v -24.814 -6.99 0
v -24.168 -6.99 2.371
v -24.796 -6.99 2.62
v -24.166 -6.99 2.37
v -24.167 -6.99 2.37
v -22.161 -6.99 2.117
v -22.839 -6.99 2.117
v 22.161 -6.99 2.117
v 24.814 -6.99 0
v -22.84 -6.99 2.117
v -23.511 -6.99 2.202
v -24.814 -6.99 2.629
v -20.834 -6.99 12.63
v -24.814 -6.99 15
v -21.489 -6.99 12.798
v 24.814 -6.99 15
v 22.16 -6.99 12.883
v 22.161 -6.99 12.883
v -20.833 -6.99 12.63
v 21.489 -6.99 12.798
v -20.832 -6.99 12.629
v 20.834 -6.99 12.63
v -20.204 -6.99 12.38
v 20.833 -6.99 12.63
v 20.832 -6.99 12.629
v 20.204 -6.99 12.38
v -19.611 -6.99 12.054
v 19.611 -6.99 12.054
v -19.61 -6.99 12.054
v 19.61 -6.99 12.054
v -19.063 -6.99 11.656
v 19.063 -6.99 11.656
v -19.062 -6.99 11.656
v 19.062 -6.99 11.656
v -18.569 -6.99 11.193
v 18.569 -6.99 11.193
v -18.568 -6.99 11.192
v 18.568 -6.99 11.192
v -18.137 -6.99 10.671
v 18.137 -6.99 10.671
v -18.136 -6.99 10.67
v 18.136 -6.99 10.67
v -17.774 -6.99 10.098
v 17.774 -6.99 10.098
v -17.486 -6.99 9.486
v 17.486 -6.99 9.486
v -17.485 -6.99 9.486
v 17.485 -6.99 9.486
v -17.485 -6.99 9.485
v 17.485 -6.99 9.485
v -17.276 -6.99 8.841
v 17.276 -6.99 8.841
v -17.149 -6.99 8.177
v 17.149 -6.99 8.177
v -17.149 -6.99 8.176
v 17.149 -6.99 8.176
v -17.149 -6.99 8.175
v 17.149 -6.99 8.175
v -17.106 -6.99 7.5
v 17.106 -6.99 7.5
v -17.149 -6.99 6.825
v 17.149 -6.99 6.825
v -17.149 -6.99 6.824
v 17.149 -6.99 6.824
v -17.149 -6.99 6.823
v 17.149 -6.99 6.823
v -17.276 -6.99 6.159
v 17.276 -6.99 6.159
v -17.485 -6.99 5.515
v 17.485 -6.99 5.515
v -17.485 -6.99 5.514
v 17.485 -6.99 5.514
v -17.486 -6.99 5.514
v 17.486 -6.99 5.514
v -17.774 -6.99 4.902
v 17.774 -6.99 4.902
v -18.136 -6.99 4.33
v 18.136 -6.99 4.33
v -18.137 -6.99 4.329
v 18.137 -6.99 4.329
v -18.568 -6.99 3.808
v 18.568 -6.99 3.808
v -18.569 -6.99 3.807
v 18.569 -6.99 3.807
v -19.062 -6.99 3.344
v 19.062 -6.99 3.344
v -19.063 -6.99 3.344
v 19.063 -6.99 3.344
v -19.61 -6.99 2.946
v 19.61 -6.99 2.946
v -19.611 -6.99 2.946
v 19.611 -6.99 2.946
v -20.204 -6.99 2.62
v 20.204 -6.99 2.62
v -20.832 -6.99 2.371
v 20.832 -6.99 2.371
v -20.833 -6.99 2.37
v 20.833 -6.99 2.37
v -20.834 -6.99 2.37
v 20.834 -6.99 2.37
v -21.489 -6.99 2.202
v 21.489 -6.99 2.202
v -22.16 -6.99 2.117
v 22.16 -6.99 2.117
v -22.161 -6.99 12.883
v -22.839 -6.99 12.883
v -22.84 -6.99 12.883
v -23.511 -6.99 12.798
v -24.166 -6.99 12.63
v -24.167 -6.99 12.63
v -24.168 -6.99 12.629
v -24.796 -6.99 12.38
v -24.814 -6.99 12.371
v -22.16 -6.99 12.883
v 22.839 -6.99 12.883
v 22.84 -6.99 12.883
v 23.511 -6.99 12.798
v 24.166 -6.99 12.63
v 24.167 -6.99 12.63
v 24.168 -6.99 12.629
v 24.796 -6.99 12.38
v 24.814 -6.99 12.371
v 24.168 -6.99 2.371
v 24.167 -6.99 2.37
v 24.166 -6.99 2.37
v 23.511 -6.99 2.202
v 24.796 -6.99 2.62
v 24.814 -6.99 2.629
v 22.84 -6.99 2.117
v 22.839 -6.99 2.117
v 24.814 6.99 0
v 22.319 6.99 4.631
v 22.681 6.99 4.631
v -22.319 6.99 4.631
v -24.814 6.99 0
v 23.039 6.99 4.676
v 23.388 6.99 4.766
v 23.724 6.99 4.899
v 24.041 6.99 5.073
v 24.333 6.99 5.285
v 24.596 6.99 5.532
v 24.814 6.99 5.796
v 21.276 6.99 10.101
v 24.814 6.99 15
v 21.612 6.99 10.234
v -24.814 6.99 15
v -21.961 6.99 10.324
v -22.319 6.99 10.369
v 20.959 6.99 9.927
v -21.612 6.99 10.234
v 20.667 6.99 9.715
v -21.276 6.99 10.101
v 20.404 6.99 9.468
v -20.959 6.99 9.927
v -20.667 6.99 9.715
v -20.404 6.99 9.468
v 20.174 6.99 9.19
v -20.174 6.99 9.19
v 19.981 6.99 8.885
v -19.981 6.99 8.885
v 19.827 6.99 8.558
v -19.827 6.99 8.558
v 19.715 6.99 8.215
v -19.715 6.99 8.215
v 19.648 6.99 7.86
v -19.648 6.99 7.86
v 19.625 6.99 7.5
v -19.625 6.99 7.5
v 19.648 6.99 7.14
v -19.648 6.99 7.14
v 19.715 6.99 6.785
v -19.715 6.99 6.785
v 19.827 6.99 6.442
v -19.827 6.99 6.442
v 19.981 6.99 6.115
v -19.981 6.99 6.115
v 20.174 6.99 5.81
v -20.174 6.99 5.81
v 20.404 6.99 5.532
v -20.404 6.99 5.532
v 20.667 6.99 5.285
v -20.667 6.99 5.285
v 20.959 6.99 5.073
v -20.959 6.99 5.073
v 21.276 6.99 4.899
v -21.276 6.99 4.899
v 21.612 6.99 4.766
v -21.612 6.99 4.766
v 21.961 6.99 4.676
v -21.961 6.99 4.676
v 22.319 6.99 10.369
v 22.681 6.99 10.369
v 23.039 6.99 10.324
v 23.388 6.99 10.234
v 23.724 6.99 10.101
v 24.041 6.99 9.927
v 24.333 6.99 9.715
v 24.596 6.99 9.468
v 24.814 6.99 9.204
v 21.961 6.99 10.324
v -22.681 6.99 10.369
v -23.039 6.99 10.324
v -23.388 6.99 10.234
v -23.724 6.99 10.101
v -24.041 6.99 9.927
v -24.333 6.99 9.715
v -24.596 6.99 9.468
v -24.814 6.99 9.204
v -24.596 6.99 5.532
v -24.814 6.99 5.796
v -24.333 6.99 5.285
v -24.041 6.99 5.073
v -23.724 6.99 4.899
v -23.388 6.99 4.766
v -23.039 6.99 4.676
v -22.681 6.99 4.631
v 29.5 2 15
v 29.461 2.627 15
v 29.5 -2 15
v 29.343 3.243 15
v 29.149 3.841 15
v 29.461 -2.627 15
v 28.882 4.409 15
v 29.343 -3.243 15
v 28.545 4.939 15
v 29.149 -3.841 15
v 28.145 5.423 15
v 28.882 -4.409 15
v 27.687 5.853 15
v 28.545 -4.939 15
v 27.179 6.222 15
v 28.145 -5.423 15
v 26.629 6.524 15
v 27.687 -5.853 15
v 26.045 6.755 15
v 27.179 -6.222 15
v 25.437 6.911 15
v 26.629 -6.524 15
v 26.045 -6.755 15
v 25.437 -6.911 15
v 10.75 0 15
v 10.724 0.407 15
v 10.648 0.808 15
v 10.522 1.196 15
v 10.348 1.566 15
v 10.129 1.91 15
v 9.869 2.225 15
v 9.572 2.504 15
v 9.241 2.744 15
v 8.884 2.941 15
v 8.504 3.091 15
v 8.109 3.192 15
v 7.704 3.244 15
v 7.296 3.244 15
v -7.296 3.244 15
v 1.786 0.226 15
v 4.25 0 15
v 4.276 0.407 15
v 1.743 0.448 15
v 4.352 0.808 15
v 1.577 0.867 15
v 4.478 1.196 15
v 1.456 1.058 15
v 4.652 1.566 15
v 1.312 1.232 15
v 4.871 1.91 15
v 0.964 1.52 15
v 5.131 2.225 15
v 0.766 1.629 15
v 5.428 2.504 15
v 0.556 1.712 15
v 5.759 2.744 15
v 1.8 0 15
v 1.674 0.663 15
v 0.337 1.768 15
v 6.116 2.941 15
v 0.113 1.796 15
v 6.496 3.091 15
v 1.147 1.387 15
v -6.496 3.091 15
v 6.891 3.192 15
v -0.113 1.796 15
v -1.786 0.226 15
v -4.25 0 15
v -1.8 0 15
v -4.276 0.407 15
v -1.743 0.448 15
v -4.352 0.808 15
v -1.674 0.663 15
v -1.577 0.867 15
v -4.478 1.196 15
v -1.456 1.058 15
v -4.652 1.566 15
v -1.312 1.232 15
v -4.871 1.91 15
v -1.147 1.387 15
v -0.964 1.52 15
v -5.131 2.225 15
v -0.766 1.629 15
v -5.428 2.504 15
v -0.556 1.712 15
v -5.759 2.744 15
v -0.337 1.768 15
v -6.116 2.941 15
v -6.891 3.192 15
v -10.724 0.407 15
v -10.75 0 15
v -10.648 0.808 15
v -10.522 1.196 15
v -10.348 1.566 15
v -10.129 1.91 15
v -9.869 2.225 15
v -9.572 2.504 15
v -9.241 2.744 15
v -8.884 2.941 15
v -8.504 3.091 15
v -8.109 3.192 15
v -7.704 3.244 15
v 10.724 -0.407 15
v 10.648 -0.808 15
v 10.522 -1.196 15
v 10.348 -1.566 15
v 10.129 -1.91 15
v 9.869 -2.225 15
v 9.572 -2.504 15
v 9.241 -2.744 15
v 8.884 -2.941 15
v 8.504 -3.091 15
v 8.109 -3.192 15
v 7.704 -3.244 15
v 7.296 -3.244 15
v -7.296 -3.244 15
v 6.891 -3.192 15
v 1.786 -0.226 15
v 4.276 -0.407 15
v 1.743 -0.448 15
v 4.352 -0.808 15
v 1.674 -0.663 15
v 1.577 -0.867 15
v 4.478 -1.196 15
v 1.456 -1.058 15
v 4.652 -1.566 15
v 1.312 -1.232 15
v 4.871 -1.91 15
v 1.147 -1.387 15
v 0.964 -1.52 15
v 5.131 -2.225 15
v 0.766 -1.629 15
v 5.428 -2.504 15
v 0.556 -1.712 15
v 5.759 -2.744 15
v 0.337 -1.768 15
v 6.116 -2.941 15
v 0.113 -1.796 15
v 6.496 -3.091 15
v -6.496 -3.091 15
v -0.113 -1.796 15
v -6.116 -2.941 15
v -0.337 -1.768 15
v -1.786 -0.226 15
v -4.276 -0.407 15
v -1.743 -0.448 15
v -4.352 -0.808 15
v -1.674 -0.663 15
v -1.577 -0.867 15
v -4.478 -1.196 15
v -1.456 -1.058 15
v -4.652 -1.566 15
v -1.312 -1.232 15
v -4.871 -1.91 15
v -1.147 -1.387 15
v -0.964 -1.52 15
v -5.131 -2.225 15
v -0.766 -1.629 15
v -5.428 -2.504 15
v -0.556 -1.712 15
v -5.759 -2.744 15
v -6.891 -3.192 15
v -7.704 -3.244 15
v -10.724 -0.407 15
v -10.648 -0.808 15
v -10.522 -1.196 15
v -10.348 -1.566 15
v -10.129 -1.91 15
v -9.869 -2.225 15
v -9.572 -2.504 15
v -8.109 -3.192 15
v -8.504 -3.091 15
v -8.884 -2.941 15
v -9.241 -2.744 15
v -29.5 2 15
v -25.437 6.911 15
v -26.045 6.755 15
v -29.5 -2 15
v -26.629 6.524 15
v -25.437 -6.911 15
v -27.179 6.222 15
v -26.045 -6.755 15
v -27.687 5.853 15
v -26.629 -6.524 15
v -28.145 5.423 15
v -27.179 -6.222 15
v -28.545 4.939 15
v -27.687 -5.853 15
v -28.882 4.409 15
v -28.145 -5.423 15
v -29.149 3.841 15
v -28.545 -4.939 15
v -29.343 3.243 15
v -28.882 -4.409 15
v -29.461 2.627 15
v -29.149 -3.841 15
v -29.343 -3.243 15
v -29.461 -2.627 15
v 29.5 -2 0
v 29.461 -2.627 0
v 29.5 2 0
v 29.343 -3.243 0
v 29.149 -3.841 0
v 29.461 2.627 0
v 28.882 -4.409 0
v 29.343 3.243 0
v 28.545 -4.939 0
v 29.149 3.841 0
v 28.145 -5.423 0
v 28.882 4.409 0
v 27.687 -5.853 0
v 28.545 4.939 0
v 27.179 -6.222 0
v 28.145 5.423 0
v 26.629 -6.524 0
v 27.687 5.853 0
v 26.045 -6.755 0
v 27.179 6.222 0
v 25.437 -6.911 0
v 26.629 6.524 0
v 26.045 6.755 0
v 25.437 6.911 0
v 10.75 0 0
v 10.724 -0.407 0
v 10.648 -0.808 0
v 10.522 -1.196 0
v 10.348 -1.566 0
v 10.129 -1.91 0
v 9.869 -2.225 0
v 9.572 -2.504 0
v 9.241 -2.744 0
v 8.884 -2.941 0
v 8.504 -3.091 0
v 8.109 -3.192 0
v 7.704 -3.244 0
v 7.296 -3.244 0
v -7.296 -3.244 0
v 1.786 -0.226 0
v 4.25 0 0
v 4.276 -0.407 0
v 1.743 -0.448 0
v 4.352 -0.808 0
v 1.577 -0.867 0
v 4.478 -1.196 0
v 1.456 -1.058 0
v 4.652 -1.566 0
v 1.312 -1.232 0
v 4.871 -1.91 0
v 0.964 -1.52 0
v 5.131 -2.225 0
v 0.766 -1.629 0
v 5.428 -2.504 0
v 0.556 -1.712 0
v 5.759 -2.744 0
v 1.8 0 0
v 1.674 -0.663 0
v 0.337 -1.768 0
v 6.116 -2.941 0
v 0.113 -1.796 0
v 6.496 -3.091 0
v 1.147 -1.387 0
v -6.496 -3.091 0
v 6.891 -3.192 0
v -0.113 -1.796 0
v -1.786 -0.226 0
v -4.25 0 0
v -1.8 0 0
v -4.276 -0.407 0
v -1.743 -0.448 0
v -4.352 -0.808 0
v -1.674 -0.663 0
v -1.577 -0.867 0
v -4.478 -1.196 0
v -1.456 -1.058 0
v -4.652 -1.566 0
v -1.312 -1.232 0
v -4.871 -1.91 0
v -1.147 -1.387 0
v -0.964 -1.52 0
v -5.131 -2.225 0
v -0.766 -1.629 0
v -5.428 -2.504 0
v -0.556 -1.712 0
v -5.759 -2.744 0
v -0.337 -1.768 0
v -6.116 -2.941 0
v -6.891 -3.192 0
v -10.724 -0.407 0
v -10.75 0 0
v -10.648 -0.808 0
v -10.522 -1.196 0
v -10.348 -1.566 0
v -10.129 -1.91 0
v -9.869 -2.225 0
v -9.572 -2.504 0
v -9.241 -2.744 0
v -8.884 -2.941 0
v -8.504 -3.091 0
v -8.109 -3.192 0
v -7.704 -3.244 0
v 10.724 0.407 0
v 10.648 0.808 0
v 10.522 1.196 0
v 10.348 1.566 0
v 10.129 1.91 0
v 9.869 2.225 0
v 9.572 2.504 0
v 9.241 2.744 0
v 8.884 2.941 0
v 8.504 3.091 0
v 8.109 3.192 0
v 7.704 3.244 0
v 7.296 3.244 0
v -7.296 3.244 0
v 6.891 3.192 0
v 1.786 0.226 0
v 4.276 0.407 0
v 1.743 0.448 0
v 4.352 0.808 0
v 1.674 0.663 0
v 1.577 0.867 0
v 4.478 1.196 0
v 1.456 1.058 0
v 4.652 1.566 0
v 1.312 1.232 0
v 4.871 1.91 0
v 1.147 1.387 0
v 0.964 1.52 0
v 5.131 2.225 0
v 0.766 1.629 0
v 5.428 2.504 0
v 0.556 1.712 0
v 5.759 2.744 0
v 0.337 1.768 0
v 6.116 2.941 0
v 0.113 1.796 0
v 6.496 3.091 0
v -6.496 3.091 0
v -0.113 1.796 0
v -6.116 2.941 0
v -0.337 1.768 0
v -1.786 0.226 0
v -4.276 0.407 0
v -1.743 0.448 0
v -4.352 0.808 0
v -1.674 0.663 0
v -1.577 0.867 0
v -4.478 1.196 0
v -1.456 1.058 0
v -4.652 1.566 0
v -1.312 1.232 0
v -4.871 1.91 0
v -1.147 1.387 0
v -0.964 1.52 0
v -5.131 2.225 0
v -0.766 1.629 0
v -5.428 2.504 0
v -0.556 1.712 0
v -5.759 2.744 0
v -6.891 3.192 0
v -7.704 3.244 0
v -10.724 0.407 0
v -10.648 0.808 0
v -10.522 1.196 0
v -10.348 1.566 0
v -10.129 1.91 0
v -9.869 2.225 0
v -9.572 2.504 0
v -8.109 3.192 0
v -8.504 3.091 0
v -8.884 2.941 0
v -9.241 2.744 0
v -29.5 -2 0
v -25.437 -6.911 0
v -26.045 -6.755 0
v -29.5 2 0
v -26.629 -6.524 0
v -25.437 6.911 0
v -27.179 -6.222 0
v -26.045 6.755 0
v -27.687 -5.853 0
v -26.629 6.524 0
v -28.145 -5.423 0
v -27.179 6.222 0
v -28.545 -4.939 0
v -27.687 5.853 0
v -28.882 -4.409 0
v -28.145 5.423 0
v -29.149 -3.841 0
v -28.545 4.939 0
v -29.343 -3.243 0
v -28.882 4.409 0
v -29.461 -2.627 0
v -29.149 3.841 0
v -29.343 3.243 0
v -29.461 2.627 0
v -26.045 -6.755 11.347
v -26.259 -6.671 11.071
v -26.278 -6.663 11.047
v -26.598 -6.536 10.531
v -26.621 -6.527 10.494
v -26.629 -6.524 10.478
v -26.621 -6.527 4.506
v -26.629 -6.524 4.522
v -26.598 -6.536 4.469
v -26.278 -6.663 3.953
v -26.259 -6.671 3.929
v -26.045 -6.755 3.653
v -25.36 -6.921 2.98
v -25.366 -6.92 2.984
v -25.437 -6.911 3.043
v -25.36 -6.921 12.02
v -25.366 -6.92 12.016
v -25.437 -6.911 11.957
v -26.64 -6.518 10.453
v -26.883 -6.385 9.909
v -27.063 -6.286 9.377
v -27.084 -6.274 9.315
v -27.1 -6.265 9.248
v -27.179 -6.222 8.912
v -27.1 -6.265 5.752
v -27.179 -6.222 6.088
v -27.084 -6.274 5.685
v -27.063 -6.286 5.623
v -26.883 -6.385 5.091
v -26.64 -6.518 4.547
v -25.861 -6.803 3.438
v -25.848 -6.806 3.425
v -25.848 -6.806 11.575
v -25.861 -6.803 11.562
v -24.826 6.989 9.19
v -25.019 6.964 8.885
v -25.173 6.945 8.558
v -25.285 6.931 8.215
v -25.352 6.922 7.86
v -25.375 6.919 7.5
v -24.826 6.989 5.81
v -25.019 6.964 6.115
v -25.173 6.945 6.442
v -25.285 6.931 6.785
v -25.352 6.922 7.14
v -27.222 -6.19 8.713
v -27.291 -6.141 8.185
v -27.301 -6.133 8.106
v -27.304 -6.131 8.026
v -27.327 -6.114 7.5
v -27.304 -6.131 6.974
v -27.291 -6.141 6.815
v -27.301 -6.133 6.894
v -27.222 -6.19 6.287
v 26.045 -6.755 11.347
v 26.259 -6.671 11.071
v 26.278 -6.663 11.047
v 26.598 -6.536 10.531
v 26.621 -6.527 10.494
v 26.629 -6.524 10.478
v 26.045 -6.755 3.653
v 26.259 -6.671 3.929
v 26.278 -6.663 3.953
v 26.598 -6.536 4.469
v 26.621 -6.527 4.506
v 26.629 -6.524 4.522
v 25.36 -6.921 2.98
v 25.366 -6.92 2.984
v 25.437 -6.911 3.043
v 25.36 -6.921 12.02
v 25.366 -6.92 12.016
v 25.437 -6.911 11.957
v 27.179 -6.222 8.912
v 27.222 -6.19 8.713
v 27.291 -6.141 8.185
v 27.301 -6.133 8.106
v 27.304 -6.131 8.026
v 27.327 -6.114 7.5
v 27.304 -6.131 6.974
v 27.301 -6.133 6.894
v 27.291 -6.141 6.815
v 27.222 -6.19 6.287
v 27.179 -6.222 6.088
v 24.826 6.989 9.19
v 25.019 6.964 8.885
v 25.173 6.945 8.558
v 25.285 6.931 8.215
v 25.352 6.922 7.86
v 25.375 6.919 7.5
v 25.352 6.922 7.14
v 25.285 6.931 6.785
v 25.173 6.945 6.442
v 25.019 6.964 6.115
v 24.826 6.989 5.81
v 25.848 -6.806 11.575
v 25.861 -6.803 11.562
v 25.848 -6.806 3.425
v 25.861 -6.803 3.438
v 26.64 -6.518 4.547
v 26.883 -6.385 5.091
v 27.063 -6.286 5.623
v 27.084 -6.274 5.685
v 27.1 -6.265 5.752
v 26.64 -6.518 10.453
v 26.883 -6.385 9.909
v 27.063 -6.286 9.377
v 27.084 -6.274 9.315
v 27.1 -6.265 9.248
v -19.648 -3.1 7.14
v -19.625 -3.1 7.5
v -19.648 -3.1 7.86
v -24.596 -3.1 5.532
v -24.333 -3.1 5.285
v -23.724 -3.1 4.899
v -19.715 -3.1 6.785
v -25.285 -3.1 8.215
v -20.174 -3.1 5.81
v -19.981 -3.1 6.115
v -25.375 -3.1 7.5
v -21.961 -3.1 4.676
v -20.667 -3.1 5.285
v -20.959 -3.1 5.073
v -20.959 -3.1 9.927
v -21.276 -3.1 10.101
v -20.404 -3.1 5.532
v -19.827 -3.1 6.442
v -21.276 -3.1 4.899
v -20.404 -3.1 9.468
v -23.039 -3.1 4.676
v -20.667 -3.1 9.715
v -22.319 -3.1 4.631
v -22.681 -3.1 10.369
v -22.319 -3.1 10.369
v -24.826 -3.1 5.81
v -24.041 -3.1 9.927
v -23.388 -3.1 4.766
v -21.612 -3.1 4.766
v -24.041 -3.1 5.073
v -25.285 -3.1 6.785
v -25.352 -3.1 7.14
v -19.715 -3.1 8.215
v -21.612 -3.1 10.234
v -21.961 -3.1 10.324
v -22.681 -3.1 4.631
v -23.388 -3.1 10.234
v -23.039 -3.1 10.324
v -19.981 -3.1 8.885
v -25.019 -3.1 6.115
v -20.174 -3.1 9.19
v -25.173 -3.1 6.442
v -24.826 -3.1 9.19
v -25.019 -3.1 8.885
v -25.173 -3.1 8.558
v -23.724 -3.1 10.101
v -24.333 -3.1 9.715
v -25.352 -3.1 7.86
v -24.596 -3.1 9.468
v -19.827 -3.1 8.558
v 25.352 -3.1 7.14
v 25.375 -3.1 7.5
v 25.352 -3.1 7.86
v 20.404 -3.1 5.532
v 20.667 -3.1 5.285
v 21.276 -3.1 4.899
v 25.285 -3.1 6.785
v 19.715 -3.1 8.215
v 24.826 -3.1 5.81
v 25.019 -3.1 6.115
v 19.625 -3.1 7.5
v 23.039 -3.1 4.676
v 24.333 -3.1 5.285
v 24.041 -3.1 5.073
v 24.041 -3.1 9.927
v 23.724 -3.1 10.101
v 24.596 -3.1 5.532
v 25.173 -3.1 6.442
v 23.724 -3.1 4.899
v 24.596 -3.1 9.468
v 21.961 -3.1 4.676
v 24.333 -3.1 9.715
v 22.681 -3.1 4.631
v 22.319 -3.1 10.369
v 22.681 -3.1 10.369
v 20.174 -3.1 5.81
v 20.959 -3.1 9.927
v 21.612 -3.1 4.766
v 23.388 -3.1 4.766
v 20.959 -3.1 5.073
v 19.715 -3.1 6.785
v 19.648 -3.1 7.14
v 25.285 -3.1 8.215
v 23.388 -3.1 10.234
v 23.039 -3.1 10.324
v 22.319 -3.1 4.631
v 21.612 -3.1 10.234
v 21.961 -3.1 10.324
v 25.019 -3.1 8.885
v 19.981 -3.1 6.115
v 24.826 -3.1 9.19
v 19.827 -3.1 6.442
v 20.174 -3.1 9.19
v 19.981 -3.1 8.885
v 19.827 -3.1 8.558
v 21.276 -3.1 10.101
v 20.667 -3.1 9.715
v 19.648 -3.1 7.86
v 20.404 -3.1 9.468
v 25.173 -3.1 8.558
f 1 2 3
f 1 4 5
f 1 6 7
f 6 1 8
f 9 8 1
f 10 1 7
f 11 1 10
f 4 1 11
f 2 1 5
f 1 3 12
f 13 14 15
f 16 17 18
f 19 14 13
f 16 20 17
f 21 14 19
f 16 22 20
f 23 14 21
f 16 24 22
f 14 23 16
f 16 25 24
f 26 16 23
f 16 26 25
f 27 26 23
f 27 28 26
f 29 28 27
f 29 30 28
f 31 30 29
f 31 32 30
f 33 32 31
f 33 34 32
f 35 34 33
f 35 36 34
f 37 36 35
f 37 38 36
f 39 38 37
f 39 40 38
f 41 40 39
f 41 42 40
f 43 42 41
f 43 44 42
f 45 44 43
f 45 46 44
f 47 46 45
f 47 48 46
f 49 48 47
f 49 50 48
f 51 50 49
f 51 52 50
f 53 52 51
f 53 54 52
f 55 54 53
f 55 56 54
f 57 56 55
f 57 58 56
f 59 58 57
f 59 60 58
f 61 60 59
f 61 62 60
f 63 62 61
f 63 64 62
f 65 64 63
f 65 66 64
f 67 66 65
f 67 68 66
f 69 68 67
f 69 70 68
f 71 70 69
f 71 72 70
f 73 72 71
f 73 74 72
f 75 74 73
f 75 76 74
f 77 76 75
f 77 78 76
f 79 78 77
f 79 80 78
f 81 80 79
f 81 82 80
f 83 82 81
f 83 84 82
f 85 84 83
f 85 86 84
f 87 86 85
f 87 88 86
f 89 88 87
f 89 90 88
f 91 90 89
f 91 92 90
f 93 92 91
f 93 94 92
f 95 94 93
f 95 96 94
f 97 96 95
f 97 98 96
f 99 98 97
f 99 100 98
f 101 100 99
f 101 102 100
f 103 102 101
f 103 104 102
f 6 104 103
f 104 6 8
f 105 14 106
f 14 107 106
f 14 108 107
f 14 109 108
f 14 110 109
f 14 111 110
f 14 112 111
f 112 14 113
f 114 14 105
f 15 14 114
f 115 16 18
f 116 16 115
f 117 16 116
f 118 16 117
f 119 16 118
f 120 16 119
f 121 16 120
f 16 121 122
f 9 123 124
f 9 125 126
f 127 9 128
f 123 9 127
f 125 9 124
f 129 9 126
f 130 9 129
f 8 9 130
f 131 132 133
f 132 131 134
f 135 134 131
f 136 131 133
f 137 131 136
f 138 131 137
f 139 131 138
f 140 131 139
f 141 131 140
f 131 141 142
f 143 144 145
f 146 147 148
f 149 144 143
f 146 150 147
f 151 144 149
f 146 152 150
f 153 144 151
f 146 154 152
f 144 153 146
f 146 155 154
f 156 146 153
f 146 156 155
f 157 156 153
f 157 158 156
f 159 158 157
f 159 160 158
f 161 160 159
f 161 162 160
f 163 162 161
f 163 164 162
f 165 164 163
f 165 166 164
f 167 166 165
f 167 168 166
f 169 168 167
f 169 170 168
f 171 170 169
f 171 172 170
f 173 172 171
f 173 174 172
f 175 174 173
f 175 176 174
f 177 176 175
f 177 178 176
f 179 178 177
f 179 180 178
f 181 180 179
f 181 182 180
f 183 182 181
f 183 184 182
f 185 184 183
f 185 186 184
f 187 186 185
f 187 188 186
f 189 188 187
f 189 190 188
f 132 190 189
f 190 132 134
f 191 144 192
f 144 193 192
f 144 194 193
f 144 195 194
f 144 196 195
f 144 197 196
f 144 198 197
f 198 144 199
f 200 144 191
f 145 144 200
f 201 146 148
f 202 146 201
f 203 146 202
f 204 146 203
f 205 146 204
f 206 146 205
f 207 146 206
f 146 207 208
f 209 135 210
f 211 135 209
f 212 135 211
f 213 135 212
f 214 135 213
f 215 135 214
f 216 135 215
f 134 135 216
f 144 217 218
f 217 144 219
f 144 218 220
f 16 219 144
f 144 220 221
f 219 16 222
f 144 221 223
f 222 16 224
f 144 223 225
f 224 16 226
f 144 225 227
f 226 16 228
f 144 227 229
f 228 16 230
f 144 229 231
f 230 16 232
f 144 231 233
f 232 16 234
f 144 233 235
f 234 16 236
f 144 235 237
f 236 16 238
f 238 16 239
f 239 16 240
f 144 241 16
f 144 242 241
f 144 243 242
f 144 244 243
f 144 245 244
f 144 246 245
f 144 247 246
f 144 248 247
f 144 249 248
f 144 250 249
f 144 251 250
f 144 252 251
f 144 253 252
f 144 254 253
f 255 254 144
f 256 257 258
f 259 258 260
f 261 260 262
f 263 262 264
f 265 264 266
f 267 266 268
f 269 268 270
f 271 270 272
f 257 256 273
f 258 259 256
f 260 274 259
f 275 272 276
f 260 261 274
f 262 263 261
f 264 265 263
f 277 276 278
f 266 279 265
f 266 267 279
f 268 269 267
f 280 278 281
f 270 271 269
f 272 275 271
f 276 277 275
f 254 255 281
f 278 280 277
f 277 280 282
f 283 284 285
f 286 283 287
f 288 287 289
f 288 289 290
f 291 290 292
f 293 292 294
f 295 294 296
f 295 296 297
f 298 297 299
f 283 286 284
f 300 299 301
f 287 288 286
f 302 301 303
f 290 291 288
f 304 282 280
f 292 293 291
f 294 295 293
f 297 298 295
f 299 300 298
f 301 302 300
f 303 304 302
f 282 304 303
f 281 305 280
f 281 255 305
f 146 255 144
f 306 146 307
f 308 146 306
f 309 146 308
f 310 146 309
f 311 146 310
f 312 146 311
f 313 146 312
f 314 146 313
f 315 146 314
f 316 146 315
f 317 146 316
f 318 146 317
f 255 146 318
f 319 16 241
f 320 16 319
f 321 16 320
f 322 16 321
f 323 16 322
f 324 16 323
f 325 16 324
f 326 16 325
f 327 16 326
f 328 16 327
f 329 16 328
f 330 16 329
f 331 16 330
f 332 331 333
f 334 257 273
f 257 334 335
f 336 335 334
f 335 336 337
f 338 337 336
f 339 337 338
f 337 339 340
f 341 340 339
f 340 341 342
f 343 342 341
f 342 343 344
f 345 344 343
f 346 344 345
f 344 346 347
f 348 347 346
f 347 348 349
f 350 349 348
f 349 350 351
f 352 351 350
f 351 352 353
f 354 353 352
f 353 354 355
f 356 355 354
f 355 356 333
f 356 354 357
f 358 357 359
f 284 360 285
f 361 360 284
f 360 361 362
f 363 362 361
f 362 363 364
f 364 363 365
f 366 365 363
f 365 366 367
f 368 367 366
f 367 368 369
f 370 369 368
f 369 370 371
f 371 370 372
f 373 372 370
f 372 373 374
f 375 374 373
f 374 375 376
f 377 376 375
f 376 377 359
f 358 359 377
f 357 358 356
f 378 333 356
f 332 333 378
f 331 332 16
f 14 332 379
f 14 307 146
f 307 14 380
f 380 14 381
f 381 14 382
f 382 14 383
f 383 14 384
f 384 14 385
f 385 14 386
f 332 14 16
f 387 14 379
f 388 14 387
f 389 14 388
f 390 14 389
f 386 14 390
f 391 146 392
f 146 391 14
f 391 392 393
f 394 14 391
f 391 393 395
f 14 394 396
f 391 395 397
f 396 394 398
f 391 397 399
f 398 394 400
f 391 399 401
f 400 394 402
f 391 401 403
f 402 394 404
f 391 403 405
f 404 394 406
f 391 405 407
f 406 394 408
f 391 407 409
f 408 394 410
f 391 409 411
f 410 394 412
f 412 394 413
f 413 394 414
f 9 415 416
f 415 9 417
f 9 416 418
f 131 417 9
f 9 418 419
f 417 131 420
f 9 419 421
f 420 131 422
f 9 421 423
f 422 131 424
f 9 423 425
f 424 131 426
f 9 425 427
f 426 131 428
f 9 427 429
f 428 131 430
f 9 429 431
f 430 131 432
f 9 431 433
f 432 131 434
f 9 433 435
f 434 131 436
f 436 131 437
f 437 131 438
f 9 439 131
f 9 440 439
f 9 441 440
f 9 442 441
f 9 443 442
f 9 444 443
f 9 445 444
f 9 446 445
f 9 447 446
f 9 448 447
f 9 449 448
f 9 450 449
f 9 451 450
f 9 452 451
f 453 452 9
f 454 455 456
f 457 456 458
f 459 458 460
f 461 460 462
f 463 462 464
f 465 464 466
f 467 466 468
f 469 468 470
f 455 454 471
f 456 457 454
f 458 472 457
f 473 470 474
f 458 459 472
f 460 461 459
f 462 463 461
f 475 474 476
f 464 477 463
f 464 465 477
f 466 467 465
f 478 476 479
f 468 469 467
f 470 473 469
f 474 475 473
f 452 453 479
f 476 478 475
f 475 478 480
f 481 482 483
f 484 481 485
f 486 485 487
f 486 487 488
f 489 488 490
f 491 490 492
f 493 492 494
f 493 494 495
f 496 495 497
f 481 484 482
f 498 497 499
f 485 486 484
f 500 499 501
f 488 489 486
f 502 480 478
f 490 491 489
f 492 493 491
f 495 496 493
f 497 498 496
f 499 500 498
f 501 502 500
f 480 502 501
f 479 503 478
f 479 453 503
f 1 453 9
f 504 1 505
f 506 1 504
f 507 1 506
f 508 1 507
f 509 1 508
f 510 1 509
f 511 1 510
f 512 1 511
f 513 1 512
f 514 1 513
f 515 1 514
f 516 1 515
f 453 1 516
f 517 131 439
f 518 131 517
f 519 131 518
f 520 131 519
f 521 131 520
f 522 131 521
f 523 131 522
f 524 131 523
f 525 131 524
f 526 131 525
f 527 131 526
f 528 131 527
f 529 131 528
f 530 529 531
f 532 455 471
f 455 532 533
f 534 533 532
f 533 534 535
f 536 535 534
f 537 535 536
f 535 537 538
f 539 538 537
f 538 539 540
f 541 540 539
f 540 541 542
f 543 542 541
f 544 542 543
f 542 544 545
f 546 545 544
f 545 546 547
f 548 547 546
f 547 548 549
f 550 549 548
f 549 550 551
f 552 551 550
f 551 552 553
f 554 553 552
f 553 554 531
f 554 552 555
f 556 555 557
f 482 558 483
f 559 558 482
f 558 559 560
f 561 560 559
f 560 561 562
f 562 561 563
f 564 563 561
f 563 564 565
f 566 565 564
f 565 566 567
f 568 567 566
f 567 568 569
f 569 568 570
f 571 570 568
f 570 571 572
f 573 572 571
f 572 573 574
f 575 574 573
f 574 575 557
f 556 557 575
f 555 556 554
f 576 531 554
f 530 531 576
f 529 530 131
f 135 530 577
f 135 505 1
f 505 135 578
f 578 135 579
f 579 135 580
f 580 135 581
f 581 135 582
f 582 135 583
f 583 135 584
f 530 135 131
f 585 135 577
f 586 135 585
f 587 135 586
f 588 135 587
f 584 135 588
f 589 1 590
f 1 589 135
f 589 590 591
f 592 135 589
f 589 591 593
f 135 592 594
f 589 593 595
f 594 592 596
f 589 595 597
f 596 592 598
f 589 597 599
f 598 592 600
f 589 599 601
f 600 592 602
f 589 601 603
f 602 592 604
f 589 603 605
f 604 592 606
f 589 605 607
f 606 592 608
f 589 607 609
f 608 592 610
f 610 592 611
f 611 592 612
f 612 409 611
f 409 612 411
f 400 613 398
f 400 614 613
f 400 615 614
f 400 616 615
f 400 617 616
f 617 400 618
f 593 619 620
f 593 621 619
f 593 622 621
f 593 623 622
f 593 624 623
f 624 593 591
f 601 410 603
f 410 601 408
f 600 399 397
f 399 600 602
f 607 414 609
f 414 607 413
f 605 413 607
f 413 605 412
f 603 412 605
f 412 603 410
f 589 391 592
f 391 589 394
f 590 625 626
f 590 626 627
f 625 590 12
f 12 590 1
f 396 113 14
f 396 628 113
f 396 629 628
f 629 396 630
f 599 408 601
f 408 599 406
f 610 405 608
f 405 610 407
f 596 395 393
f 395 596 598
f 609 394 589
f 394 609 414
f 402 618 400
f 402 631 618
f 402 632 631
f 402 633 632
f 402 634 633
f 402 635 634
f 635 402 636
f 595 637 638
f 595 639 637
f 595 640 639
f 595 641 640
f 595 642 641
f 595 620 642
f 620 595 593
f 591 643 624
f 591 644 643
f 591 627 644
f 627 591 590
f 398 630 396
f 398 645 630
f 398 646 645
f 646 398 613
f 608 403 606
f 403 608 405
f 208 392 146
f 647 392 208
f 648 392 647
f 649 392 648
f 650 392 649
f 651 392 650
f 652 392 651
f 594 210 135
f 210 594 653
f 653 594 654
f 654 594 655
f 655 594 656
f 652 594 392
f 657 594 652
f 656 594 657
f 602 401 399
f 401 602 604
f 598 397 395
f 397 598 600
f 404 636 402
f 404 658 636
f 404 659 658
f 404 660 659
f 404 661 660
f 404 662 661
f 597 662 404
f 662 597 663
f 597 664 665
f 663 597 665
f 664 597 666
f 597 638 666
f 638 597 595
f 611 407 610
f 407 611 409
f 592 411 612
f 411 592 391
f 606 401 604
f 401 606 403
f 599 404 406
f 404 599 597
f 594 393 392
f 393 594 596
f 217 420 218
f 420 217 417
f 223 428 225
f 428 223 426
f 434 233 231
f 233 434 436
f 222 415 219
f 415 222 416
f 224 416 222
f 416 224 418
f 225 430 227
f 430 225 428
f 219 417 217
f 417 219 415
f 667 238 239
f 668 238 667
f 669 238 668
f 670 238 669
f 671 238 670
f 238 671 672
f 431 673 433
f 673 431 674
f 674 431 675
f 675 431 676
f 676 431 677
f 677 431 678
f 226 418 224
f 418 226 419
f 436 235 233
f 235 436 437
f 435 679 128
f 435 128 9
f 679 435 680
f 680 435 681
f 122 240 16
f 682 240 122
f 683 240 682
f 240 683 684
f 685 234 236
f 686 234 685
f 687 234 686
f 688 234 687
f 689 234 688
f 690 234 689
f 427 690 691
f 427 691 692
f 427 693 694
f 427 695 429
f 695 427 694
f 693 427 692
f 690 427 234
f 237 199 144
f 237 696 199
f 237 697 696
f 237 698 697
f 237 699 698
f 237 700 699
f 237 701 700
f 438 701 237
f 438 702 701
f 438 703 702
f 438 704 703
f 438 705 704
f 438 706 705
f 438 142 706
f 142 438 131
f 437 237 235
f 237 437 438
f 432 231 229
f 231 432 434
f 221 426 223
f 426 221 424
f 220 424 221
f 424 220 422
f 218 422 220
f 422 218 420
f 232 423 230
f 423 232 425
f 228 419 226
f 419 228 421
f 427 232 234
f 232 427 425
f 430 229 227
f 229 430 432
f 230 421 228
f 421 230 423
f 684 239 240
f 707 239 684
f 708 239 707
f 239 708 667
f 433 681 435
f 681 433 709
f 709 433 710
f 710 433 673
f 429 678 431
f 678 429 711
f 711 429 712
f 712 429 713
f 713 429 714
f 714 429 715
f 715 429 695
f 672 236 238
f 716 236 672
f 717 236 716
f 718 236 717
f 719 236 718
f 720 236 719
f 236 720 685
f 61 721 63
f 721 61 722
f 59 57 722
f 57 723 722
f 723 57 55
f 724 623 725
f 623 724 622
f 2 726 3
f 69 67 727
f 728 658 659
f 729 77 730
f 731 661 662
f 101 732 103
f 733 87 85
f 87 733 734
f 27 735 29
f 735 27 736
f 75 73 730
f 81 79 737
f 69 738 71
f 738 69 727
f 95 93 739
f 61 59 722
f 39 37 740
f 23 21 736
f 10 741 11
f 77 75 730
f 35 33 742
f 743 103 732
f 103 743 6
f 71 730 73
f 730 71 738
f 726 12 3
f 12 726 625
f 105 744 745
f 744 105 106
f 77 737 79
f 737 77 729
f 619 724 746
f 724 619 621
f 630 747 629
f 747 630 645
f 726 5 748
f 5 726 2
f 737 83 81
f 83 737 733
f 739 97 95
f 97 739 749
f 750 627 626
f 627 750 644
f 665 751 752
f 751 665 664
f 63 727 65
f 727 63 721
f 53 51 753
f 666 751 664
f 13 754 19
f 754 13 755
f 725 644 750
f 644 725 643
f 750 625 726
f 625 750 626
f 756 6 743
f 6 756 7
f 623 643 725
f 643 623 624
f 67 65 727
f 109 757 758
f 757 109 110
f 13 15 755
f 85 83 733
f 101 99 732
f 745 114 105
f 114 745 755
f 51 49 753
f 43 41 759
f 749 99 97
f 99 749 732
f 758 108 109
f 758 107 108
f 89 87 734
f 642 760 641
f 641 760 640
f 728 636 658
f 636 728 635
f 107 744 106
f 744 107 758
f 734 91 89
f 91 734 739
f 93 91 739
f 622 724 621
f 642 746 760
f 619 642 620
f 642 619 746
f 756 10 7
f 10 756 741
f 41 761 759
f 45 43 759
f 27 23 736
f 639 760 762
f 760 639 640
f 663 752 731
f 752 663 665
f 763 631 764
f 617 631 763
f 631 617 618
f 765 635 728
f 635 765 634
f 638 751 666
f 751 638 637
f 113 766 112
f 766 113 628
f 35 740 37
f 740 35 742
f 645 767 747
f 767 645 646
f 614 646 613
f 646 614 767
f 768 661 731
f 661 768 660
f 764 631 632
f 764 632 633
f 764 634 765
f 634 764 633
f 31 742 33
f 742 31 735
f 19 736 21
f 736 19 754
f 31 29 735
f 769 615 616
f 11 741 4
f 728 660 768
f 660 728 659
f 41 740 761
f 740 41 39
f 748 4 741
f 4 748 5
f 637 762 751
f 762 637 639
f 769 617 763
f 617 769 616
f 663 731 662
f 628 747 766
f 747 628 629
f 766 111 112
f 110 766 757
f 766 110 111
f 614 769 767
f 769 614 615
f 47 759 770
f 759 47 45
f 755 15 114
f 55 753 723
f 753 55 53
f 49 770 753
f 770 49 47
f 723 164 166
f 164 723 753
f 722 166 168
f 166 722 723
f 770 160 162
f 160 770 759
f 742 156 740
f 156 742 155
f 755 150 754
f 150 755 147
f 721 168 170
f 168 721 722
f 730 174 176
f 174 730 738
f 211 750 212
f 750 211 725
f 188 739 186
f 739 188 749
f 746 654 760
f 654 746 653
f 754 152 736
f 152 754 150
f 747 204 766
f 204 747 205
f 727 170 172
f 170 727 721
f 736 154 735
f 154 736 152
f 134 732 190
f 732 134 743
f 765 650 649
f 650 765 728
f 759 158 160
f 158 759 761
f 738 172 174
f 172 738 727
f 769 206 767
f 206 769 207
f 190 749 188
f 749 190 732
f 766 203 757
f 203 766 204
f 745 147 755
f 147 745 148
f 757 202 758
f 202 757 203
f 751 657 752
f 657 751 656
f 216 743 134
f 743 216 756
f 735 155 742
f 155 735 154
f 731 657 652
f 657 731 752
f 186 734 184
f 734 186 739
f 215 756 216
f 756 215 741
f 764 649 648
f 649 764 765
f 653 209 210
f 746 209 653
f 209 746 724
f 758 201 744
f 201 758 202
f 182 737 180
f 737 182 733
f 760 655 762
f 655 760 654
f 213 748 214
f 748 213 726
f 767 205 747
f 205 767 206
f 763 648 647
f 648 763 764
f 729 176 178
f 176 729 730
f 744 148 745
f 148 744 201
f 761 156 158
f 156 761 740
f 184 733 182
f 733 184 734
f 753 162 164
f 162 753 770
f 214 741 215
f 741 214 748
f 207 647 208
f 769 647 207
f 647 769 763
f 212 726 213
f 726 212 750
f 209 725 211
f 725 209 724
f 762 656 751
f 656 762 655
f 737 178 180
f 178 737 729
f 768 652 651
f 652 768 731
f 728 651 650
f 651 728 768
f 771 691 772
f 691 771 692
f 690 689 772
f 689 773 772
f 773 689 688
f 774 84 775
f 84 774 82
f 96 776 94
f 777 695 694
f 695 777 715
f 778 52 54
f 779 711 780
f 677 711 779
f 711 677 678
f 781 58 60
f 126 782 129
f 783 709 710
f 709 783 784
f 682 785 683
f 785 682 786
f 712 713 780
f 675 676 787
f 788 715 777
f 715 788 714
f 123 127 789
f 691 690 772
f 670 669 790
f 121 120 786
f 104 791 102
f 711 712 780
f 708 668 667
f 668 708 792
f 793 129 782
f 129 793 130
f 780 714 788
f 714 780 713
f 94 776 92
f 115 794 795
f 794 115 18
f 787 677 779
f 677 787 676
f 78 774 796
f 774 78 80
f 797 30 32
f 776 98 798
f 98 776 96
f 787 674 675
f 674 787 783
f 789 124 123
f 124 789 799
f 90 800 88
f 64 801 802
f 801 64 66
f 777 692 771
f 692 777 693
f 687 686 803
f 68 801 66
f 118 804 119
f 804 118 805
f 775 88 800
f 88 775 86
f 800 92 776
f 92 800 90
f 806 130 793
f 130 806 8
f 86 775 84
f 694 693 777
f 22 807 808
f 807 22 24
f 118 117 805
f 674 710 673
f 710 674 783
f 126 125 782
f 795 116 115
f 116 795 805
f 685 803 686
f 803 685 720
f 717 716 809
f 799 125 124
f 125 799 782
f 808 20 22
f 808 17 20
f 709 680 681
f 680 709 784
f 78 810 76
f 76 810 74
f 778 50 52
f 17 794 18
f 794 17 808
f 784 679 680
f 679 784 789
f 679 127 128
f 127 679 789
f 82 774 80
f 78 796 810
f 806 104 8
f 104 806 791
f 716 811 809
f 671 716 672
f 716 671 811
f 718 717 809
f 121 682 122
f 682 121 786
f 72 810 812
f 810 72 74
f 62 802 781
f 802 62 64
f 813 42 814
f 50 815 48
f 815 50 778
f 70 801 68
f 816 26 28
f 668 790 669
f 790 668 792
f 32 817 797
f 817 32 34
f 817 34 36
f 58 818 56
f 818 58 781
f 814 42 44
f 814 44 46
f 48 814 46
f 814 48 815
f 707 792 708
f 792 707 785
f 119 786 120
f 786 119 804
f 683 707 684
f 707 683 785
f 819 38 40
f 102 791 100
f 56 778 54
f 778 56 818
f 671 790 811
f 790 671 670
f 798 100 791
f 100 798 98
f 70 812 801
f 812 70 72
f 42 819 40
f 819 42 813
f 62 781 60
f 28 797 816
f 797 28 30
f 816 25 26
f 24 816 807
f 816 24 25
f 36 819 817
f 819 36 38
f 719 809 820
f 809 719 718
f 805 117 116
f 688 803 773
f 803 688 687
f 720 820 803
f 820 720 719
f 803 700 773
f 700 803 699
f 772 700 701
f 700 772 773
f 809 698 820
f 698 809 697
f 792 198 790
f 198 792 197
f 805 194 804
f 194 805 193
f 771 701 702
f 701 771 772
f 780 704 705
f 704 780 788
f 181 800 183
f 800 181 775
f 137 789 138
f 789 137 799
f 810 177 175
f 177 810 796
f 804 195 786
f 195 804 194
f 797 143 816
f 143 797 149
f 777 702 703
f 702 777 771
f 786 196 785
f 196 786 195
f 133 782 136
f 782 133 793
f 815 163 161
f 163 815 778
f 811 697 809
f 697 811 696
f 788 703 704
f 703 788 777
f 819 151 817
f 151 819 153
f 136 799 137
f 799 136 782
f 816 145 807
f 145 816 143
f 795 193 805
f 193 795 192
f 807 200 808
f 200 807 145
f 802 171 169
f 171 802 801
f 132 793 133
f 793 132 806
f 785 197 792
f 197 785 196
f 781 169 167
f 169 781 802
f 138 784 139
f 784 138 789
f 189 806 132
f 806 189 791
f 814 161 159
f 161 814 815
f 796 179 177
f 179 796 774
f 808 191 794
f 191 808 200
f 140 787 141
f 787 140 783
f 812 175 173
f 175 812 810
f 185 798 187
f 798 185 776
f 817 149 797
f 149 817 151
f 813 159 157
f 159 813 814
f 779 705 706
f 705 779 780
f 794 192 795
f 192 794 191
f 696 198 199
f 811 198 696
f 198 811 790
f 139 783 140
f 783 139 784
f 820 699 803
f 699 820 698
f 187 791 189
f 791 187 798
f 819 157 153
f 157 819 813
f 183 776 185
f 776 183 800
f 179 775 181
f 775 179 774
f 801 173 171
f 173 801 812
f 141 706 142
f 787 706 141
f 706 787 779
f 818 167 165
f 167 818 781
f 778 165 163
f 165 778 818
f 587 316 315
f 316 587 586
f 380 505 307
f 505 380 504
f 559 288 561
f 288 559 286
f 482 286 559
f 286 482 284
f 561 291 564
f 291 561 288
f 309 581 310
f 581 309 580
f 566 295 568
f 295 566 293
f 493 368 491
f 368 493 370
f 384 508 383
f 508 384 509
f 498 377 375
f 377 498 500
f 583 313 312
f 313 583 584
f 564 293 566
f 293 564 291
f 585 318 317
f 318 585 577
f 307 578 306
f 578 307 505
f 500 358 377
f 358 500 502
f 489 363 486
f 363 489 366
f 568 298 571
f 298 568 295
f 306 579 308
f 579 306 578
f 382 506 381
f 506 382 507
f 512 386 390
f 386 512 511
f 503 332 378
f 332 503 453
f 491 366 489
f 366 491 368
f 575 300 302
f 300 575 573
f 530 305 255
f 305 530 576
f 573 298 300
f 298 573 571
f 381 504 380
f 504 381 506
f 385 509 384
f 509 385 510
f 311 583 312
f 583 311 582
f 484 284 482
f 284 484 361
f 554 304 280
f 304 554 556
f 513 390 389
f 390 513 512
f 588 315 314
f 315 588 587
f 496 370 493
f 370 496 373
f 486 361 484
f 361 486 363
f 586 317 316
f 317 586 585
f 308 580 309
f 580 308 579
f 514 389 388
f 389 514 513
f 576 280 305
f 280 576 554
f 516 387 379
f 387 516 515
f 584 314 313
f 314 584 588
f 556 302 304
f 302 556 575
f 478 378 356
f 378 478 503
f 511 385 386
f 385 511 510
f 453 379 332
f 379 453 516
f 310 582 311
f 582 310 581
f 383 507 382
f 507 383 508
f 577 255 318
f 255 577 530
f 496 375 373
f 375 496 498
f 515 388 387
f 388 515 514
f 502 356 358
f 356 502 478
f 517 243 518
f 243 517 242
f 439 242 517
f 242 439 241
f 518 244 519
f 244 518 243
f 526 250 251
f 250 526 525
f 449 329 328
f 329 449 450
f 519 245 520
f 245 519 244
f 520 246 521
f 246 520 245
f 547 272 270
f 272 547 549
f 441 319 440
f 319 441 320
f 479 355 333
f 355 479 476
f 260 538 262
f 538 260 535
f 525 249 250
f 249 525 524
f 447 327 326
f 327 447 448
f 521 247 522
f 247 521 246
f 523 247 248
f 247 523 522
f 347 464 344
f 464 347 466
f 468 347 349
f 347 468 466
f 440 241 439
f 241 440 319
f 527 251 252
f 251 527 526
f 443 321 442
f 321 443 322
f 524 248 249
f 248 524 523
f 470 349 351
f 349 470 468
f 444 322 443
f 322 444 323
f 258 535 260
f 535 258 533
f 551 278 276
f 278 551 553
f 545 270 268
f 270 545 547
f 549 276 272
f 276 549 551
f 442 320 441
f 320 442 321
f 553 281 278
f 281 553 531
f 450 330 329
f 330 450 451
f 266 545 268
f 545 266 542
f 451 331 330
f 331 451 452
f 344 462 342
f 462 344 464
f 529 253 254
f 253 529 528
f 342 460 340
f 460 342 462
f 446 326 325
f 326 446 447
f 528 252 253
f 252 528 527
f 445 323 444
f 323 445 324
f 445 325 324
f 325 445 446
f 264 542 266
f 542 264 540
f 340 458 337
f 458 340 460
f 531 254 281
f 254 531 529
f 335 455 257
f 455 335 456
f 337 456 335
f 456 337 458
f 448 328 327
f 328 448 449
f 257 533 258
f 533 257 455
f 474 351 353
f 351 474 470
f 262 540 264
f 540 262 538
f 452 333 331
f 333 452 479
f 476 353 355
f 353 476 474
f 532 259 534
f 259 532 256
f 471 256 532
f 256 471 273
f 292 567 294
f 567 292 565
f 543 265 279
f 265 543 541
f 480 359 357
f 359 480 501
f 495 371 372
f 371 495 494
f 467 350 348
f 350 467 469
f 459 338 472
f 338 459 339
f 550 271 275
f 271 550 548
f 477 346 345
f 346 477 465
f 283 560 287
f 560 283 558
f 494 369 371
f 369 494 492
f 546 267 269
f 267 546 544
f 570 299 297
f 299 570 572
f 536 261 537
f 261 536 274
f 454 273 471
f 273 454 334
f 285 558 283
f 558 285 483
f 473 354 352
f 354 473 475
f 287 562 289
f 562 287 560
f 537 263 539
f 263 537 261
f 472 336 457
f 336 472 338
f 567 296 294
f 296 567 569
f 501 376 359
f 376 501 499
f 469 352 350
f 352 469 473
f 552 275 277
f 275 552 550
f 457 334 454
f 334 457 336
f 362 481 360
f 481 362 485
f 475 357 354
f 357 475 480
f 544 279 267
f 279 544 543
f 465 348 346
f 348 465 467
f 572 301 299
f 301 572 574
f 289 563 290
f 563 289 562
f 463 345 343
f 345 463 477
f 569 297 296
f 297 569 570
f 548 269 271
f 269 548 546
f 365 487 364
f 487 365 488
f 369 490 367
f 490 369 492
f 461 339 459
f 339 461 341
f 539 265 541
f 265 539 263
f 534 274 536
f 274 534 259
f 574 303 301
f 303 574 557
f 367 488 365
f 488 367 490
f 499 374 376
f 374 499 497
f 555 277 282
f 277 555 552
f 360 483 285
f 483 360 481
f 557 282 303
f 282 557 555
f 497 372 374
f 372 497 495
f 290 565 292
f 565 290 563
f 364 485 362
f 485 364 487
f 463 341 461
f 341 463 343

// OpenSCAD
$fn = 50;


difference() {
	union() {
		hull() {
			translate(v = [-9.5000000000, 2.0000000000, 0]) {
				cylinder(h = 15, r = 5);
			}
			translate(v = [9.5000000000, 2.0000000000, 0]) {
				cylinder(h = 15, r = 5);
			}
			translate(v = [-9.5000000000, -2.0000000000, 0]) {
				cylinder(h = 15, r = 5);
			}
			translate(v = [9.5000000000, -2.0000000000, 0]) {
				cylinder(h = 15, r = 5);
			}
		}
		translate(v = [-15.0000000000, 0.0000000000, 0]) {
			hull() {
				translate(v = [-9.5000000000, 2.0000000000, 0]) {
					cylinder(h = 15, r = 5);
				}
				translate(v = [9.5000000000, 2.0000000000, 0]) {
					cylinder(h = 15, r = 5);
				}
				translate(v = [-9.5000000000, -2.0000000000, 0]) {
					cylinder(h = 15, r = 5);
				}
				translate(v = [9.5000000000, -2.0000000000, 0]) {
					cylinder(h = 15, r = 5);
				}
			}
		}
		translate(v = [-15.0000000000, 0.0000000000, 0]) {
			hull() {
				translate(v = [-9.5000000000, 2.0000000000, 0]) {
					cylinder(h = 15, r = 5);
				}
				translate(v = [9.5000000000, 2.0000000000, 0]) {
					cylinder(h = 15, r = 5);
				}
				translate(v = [-9.5000000000, -2.0000000000, 0]) {
					cylinder(h = 15, r = 5);
				}
				translate(v = [9.5000000000, -2.0000000000, 0]) {
					cylinder(h = 15, r = 5);
				}
			}
		}
		translate(v = [15.0000000000, 0.0000000000, 0]) {
			hull() {
				translate(v = [-9.5000000000, 2.0000000000, 0]) {
					cylinder(h = 15, r = 5);
				}
				translate(v = [9.5000000000, 2.0000000000, 0]) {
					cylinder(h = 15, r = 5);
				}
				translate(v = [-9.5000000000, -2.0000000000, 0]) {
					cylinder(h = 15, r = 5);
				}
				translate(v = [9.5000000000, -2.0000000000, 0]) {
					cylinder(h = 15, r = 5);
				}
			}
		}
		translate(v = [15.0000000000, 0.0000000000, 0]) {
			hull() {
				translate(v = [-9.5000000000, 2.0000000000, 0]) {
					cylinder(h = 15, r = 5);
				}
				translate(v = [9.5000000000, 2.0000000000, 0]) {
					cylinder(h = 15, r = 5);
				}
				translate(v = [-9.5000000000, -2.0000000000, 0]) {
					cylinder(h = 15, r = 5);
				}
				translate(v = [9.5000000000, -2.0000000000, 0]) {
					cylinder(h = 15, r = 5);
				}
			}
		}
	}
	union() {
		translate(v = [-22.5000000000, -7.0000000000, 7.5000000000]) {
			rotate(a = [90, 0, 0]) {
				difference() {
					union() {
						#translate(v = [0, 0, -14.0000000000]) {
							cylinder(h = 14, r = 2.6000000000);
						}
						#translate(v = [0, 0, -3.9000000000]) {
							cylinder(h = 3.9000000000, r1 = 2.8750000000, r2 = 5.4000000000);
						}
						#translate(v = [0, 0, -14.0000000000]) {
							cylinder(h = 14, r = 2.8750000000);
						}
						#translate(v = [0, 0, -14.0000000000]) {
							cylinder(h = 14, r = 2.6000000000);
						}
					}
					union();
				}
			}
		}
		translate(v = [22.5000000000, -7.0000000000, 7.5000000000]) {
			rotate(a = [90, 0, 0]) {
				difference() {
					union() {
						#translate(v = [0, 0, -14.0000000000]) {
							cylinder(h = 14, r = 2.6000000000);
						}
						#translate(v = [0, 0, -3.9000000000]) {
							cylinder(h = 3.9000000000, r1 = 2.8750000000, r2 = 5.4000000000);
						}
						#translate(v = [0, 0, -14.0000000000]) {
							cylinder(h = 14, r = 2.8750000000);
						}
						#translate(v = [0, 0, -14.0000000000]) {
							cylinder(h = 14, r = 2.6000000000);
						}
					}
					union();
				}
			}
		}
		translate(v = [-7.5000000000, 0.0000000000, 0]) {
			translate(v = [0, 0, -100]) {
				cylinder(h = 200, r = 3.2500000000);
			}
		}
		translate(v = [7.5000000000, 0.0000000000, 0]) {
			translate(v = [0, 0, -100]) {
				cylinder(h = 200, r = 3.2500000000);
			}
		}
		translate(v = [-7.5000000000, 0.0000000000, 0]) {
			translate(v = [0, 0, -100]) {
				cylinder(h = 200, r = 1.8000000000);
			}
		}
		translate(v = [0, 0, -100]) {
			cylinder(h = 200, r = 1.8000000000);
		}
		translate(v = [7.5000000000, 0.0000000000, 0]) {
			translate(v = [0, 0, -100]) {
				cylinder(h = 200, r = 1.8000000000);
			}
		}
	}
}
